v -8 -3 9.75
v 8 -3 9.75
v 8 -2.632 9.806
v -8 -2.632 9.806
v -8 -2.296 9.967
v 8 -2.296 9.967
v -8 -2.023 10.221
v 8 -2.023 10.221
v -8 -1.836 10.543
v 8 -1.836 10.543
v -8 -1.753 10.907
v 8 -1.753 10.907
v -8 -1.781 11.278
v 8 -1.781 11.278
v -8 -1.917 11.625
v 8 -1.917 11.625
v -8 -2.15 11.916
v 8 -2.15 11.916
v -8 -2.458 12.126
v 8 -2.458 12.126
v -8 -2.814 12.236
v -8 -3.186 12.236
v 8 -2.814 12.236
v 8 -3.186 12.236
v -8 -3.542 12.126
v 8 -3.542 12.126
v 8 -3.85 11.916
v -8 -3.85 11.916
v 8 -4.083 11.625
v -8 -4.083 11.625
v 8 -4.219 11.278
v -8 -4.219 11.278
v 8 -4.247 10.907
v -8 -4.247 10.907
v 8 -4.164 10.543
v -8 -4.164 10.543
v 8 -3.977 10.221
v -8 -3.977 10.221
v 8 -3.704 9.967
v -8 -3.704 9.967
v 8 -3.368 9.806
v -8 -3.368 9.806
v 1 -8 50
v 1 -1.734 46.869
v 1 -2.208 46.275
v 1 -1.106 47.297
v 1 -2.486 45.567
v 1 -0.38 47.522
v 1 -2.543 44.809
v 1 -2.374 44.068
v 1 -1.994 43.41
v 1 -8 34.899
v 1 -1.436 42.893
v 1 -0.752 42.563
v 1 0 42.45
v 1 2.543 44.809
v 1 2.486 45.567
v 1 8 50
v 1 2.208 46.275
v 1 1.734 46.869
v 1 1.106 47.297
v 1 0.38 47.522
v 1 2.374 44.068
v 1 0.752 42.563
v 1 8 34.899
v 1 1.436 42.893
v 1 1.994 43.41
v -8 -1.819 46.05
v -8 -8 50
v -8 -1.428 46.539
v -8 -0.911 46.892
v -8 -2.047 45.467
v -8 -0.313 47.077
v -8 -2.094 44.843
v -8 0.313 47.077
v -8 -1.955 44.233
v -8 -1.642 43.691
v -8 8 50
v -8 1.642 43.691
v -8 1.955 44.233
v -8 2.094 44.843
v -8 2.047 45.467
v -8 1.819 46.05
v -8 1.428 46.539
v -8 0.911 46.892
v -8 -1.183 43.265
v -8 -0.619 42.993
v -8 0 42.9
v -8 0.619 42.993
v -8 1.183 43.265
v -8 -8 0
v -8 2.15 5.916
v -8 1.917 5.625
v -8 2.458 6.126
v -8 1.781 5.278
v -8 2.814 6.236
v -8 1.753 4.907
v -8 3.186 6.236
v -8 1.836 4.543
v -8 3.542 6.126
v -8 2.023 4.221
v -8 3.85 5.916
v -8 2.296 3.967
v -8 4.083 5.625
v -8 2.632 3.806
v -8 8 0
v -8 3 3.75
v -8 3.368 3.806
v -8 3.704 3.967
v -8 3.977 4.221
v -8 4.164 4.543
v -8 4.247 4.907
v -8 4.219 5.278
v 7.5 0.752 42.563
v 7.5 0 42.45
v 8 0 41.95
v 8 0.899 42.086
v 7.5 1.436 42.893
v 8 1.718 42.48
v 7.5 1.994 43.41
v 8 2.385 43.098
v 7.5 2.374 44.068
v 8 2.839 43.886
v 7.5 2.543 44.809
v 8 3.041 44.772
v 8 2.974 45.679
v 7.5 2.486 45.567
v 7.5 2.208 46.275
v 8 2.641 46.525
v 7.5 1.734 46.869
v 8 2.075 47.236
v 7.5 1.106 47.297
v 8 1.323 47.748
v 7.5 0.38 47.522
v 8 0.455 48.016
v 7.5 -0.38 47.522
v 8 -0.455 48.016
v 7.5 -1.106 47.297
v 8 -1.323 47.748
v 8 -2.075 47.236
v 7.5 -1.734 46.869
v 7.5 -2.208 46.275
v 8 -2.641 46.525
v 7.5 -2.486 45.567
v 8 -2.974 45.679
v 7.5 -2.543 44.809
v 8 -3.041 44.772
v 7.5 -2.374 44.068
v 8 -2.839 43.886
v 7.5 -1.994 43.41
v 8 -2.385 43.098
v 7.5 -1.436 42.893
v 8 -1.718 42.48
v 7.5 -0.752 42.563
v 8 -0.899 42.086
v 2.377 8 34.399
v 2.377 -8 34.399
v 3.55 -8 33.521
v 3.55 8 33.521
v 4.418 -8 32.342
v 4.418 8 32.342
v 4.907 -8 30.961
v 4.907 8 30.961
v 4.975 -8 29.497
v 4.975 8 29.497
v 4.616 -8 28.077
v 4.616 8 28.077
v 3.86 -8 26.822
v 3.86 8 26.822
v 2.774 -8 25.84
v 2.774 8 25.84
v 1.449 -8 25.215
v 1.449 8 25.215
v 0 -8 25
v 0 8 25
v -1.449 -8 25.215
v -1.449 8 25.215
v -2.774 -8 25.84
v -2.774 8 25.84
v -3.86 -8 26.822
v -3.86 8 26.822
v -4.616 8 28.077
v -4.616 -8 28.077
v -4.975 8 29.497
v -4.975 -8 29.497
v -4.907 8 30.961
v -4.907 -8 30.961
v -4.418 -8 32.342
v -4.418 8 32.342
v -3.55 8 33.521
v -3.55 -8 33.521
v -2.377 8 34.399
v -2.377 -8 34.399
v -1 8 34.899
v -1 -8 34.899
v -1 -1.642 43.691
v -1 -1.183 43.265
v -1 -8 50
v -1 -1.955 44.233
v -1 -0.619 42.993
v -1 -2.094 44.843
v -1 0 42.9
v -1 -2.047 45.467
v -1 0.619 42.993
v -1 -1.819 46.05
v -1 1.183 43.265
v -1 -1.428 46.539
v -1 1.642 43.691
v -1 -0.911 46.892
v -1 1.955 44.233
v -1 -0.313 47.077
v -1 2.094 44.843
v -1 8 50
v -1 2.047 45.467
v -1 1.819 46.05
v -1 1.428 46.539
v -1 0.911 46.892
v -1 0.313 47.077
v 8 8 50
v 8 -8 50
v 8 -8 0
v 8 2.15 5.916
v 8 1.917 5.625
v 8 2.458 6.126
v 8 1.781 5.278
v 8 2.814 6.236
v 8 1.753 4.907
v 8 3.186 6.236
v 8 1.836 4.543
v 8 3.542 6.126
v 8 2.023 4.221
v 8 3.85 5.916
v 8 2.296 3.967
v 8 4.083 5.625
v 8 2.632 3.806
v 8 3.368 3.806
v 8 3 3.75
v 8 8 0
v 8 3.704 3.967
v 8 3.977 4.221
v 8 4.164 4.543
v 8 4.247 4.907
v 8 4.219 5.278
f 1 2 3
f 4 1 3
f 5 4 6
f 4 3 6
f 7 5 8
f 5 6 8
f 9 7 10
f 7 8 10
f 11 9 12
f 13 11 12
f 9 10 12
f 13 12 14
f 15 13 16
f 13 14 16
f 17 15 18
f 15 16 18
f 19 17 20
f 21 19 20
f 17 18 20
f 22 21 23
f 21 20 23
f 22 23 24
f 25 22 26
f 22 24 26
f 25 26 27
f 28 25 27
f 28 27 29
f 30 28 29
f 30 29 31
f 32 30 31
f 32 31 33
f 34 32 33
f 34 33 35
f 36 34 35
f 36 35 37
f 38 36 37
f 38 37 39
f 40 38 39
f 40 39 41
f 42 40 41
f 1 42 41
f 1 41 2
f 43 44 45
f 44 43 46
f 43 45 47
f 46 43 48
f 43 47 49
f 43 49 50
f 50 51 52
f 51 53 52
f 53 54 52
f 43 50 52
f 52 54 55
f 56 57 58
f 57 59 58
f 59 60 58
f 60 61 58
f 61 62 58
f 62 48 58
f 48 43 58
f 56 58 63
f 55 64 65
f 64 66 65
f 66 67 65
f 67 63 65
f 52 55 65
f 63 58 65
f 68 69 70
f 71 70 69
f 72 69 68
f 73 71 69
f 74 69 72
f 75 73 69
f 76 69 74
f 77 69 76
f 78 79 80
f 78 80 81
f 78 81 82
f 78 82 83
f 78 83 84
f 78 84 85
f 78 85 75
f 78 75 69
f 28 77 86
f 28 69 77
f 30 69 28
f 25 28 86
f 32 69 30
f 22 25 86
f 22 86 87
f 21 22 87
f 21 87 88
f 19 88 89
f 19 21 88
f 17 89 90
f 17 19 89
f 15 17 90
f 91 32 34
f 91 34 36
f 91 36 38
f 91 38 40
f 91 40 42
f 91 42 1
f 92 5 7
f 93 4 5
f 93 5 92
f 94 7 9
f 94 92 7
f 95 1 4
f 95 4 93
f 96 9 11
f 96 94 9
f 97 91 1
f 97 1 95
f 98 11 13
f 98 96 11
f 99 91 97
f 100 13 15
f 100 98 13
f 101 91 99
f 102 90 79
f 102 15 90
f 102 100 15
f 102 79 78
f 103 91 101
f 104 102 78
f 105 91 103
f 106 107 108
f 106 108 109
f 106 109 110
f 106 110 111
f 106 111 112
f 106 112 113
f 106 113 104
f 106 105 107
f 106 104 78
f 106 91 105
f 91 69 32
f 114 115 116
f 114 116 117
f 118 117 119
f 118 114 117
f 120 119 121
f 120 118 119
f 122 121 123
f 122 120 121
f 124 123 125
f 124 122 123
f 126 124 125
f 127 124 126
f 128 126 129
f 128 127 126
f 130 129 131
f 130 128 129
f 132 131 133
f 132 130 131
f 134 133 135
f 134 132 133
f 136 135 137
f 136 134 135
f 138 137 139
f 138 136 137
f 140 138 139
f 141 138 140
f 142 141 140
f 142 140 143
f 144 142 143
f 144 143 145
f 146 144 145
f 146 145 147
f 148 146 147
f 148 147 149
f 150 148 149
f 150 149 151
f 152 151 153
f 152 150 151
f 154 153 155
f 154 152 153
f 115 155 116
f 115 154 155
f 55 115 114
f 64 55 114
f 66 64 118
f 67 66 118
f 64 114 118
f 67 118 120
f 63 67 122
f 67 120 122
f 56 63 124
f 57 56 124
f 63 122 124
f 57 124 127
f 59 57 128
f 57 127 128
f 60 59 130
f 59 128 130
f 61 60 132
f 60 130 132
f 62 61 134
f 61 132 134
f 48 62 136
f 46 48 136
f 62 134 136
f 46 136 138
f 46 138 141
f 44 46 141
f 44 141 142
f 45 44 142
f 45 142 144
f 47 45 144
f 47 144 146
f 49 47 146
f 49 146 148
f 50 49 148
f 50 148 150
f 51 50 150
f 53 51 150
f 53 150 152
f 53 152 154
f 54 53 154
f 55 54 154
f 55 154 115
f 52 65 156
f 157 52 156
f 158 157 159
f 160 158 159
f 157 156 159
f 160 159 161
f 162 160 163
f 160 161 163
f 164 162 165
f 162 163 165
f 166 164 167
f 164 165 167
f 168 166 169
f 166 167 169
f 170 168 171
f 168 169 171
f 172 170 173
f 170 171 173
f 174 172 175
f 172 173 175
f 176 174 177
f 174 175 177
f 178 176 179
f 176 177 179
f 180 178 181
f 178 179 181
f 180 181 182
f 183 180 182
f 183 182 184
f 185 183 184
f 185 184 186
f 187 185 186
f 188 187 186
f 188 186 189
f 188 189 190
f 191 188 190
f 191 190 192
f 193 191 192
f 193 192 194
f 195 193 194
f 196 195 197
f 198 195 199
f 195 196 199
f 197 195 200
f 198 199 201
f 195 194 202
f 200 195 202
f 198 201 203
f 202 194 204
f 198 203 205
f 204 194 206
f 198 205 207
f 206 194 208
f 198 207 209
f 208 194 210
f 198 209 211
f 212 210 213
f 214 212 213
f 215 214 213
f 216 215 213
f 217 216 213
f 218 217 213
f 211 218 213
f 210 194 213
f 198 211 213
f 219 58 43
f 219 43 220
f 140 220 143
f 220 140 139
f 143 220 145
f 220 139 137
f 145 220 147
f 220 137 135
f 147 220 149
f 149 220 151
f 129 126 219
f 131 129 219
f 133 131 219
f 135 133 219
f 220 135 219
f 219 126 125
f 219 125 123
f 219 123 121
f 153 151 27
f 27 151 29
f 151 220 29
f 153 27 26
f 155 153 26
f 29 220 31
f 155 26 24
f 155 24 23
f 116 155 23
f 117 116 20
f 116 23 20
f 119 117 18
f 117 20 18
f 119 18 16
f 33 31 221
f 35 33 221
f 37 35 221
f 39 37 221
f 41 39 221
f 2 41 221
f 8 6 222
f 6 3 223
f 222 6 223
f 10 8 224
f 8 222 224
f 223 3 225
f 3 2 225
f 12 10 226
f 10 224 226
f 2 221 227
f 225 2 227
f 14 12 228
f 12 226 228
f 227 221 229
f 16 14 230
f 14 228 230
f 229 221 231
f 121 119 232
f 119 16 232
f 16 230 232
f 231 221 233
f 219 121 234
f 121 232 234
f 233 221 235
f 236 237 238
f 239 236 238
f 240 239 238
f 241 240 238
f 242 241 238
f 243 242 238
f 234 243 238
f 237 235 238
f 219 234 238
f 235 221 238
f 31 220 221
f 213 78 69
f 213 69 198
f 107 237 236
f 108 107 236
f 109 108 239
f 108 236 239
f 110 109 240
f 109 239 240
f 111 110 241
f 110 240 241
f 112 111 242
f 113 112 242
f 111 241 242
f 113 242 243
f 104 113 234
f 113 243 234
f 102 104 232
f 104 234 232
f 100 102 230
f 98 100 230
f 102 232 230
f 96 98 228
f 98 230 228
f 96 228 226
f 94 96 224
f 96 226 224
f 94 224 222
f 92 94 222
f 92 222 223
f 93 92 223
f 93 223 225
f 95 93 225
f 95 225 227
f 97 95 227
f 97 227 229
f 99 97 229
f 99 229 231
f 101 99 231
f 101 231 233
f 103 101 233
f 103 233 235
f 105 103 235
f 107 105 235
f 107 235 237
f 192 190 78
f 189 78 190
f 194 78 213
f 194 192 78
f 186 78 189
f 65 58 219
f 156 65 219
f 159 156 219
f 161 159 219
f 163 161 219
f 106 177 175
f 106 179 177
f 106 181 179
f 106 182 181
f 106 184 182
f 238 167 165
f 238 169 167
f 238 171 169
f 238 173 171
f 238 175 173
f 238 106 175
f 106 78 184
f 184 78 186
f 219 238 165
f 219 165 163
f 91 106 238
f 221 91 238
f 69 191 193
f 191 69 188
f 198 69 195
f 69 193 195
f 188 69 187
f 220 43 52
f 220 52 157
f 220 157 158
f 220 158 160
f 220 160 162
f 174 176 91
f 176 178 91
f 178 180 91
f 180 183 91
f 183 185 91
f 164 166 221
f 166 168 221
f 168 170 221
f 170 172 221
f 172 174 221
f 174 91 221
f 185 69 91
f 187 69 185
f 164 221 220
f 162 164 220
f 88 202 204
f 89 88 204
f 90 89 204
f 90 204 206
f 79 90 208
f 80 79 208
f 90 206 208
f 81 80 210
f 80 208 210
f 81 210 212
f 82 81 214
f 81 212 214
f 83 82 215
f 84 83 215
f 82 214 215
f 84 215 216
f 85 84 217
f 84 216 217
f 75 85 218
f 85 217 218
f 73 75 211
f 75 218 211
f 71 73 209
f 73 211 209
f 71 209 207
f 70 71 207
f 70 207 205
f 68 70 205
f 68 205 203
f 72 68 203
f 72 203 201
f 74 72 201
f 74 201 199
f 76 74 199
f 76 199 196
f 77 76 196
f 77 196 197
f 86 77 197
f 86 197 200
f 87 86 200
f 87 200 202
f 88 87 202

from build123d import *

# Parameters (mm, degrees)
SKETCH1_W                                  = 16
SKETCH1_H                                  = 16
BASE_DEPTH                                 = 50
SKETCH2_R                                  = 5
RODSLOT_DEPTH                              = 54.103672189
RODSCREWMOUNT_REACH                        = 55.104
SKETCH3_R                                  = 2.55
CHAMFERFORRODSCREW_SIZE                    = 0.5
M5X0_8_TAPPED_HOLE_FOR_ROD_SCREW_D         = 4.2
M5X0_8_TAPPED_HOLE_FOR_ROD_SCREW_DEPTH     = 7.6381927
M5X0_8_TAPPED_HOLE_FOR_ROD_SCREW_TIP       = 1.2618073
M3X0_5_TAPPED_HOLE_FOR_MOUNT_WITH_SECOND_D = 2.5


with BuildPart() as part:
    # Sketch1 → Base (new body)
    with BuildSketch(Plane.XY):
        Rectangle(SKETCH1_W, SKETCH1_H)
    extrude(amount=BASE_DEPTH)

    # Sketch2 → RodSlot (cut, through all)
    with BuildSketch(Plane(origin=(0, 8, 0), x_dir=(1, 0, 0), z_dir=(0, 1, 0))):
        with Locations((0, -30)):
            Circle(SKETCH2_R)
        with BuildLine():
            Line((-1, -34.898979486), (-1, -50))
            Line((-1, -50), (1, -50))
            Line((1, -50), (1, -34.898979486))
            ThreePointArc((1, -34.898979486), (0, -35), (-1, -34.898979486))
        make_face()
    extrude(amount=-RODSLOT_DEPTH, mode=Mode.SUBTRACT)

    # Sketch3 → RodScrewMount (cut, up to next)
    with BuildSketch(Plane(origin=(8, 0, 0), x_dir=(0, 0, -1), z_dir=(1, 0, 0)), mode=Mode.PRIVATE) as rodscrewmount_sk1:
        with Locations((-45, 0)):
            Circle(SKETCH3_R)
    rodscrewmount_tool1 = extrude(rodscrewmount_sk1.sketch, amount=-RODSCREWMOUNT_REACH, mode=Mode.PRIVATE) & part.part
    add(rodscrewmount_tool1.solids().sort_by_distance((8, 0, 45))[0], mode=Mode.SUBTRACT)

    # ChamferForRodScrew
    chamferforrodscrew_edges = [part.edges().sort_by_distance(p)[0] for p in [
        (8, 0, 47.55),
    ]]
    chamfer(chamferforrodscrew_edges, length=CHAMFERFORRODSCREW_SIZE)

    # M5x0.8 Tapped Hole for rod screw
    with Locations(Plane.ZY.offset(8)):
        with Locations((45, 0)):
            Hole(M5X0_8_TAPPED_HOLE_FOR_ROD_SCREW_D / 2, depth=M5X0_8_TAPPED_HOLE_FOR_ROD_SCREW_DEPTH)
            with Locations((0, 0, -(M5X0_8_TAPPED_HOLE_FOR_ROD_SCREW_DEPTH + M5X0_8_TAPPED_HOLE_FOR_ROD_SCREW_TIP / 2))):  # 118° drill point
                Cone(0, M5X0_8_TAPPED_HOLE_FOR_ROD_SCREW_D / 2, M5X0_8_TAPPED_HOLE_FOR_ROD_SCREW_TIP, mode=Mode.SUBTRACT)

    # M3x0.5 Tapped Hole for mount with second part (through all)
    with Locations(Plane.ZY.offset(8)):
        with Locations((5, 3), (11, -3)):
            Hole(M3X0_5_TAPPED_HOLE_FOR_MOUNT_WITH_SECOND_D / 2)


solid = part.part
